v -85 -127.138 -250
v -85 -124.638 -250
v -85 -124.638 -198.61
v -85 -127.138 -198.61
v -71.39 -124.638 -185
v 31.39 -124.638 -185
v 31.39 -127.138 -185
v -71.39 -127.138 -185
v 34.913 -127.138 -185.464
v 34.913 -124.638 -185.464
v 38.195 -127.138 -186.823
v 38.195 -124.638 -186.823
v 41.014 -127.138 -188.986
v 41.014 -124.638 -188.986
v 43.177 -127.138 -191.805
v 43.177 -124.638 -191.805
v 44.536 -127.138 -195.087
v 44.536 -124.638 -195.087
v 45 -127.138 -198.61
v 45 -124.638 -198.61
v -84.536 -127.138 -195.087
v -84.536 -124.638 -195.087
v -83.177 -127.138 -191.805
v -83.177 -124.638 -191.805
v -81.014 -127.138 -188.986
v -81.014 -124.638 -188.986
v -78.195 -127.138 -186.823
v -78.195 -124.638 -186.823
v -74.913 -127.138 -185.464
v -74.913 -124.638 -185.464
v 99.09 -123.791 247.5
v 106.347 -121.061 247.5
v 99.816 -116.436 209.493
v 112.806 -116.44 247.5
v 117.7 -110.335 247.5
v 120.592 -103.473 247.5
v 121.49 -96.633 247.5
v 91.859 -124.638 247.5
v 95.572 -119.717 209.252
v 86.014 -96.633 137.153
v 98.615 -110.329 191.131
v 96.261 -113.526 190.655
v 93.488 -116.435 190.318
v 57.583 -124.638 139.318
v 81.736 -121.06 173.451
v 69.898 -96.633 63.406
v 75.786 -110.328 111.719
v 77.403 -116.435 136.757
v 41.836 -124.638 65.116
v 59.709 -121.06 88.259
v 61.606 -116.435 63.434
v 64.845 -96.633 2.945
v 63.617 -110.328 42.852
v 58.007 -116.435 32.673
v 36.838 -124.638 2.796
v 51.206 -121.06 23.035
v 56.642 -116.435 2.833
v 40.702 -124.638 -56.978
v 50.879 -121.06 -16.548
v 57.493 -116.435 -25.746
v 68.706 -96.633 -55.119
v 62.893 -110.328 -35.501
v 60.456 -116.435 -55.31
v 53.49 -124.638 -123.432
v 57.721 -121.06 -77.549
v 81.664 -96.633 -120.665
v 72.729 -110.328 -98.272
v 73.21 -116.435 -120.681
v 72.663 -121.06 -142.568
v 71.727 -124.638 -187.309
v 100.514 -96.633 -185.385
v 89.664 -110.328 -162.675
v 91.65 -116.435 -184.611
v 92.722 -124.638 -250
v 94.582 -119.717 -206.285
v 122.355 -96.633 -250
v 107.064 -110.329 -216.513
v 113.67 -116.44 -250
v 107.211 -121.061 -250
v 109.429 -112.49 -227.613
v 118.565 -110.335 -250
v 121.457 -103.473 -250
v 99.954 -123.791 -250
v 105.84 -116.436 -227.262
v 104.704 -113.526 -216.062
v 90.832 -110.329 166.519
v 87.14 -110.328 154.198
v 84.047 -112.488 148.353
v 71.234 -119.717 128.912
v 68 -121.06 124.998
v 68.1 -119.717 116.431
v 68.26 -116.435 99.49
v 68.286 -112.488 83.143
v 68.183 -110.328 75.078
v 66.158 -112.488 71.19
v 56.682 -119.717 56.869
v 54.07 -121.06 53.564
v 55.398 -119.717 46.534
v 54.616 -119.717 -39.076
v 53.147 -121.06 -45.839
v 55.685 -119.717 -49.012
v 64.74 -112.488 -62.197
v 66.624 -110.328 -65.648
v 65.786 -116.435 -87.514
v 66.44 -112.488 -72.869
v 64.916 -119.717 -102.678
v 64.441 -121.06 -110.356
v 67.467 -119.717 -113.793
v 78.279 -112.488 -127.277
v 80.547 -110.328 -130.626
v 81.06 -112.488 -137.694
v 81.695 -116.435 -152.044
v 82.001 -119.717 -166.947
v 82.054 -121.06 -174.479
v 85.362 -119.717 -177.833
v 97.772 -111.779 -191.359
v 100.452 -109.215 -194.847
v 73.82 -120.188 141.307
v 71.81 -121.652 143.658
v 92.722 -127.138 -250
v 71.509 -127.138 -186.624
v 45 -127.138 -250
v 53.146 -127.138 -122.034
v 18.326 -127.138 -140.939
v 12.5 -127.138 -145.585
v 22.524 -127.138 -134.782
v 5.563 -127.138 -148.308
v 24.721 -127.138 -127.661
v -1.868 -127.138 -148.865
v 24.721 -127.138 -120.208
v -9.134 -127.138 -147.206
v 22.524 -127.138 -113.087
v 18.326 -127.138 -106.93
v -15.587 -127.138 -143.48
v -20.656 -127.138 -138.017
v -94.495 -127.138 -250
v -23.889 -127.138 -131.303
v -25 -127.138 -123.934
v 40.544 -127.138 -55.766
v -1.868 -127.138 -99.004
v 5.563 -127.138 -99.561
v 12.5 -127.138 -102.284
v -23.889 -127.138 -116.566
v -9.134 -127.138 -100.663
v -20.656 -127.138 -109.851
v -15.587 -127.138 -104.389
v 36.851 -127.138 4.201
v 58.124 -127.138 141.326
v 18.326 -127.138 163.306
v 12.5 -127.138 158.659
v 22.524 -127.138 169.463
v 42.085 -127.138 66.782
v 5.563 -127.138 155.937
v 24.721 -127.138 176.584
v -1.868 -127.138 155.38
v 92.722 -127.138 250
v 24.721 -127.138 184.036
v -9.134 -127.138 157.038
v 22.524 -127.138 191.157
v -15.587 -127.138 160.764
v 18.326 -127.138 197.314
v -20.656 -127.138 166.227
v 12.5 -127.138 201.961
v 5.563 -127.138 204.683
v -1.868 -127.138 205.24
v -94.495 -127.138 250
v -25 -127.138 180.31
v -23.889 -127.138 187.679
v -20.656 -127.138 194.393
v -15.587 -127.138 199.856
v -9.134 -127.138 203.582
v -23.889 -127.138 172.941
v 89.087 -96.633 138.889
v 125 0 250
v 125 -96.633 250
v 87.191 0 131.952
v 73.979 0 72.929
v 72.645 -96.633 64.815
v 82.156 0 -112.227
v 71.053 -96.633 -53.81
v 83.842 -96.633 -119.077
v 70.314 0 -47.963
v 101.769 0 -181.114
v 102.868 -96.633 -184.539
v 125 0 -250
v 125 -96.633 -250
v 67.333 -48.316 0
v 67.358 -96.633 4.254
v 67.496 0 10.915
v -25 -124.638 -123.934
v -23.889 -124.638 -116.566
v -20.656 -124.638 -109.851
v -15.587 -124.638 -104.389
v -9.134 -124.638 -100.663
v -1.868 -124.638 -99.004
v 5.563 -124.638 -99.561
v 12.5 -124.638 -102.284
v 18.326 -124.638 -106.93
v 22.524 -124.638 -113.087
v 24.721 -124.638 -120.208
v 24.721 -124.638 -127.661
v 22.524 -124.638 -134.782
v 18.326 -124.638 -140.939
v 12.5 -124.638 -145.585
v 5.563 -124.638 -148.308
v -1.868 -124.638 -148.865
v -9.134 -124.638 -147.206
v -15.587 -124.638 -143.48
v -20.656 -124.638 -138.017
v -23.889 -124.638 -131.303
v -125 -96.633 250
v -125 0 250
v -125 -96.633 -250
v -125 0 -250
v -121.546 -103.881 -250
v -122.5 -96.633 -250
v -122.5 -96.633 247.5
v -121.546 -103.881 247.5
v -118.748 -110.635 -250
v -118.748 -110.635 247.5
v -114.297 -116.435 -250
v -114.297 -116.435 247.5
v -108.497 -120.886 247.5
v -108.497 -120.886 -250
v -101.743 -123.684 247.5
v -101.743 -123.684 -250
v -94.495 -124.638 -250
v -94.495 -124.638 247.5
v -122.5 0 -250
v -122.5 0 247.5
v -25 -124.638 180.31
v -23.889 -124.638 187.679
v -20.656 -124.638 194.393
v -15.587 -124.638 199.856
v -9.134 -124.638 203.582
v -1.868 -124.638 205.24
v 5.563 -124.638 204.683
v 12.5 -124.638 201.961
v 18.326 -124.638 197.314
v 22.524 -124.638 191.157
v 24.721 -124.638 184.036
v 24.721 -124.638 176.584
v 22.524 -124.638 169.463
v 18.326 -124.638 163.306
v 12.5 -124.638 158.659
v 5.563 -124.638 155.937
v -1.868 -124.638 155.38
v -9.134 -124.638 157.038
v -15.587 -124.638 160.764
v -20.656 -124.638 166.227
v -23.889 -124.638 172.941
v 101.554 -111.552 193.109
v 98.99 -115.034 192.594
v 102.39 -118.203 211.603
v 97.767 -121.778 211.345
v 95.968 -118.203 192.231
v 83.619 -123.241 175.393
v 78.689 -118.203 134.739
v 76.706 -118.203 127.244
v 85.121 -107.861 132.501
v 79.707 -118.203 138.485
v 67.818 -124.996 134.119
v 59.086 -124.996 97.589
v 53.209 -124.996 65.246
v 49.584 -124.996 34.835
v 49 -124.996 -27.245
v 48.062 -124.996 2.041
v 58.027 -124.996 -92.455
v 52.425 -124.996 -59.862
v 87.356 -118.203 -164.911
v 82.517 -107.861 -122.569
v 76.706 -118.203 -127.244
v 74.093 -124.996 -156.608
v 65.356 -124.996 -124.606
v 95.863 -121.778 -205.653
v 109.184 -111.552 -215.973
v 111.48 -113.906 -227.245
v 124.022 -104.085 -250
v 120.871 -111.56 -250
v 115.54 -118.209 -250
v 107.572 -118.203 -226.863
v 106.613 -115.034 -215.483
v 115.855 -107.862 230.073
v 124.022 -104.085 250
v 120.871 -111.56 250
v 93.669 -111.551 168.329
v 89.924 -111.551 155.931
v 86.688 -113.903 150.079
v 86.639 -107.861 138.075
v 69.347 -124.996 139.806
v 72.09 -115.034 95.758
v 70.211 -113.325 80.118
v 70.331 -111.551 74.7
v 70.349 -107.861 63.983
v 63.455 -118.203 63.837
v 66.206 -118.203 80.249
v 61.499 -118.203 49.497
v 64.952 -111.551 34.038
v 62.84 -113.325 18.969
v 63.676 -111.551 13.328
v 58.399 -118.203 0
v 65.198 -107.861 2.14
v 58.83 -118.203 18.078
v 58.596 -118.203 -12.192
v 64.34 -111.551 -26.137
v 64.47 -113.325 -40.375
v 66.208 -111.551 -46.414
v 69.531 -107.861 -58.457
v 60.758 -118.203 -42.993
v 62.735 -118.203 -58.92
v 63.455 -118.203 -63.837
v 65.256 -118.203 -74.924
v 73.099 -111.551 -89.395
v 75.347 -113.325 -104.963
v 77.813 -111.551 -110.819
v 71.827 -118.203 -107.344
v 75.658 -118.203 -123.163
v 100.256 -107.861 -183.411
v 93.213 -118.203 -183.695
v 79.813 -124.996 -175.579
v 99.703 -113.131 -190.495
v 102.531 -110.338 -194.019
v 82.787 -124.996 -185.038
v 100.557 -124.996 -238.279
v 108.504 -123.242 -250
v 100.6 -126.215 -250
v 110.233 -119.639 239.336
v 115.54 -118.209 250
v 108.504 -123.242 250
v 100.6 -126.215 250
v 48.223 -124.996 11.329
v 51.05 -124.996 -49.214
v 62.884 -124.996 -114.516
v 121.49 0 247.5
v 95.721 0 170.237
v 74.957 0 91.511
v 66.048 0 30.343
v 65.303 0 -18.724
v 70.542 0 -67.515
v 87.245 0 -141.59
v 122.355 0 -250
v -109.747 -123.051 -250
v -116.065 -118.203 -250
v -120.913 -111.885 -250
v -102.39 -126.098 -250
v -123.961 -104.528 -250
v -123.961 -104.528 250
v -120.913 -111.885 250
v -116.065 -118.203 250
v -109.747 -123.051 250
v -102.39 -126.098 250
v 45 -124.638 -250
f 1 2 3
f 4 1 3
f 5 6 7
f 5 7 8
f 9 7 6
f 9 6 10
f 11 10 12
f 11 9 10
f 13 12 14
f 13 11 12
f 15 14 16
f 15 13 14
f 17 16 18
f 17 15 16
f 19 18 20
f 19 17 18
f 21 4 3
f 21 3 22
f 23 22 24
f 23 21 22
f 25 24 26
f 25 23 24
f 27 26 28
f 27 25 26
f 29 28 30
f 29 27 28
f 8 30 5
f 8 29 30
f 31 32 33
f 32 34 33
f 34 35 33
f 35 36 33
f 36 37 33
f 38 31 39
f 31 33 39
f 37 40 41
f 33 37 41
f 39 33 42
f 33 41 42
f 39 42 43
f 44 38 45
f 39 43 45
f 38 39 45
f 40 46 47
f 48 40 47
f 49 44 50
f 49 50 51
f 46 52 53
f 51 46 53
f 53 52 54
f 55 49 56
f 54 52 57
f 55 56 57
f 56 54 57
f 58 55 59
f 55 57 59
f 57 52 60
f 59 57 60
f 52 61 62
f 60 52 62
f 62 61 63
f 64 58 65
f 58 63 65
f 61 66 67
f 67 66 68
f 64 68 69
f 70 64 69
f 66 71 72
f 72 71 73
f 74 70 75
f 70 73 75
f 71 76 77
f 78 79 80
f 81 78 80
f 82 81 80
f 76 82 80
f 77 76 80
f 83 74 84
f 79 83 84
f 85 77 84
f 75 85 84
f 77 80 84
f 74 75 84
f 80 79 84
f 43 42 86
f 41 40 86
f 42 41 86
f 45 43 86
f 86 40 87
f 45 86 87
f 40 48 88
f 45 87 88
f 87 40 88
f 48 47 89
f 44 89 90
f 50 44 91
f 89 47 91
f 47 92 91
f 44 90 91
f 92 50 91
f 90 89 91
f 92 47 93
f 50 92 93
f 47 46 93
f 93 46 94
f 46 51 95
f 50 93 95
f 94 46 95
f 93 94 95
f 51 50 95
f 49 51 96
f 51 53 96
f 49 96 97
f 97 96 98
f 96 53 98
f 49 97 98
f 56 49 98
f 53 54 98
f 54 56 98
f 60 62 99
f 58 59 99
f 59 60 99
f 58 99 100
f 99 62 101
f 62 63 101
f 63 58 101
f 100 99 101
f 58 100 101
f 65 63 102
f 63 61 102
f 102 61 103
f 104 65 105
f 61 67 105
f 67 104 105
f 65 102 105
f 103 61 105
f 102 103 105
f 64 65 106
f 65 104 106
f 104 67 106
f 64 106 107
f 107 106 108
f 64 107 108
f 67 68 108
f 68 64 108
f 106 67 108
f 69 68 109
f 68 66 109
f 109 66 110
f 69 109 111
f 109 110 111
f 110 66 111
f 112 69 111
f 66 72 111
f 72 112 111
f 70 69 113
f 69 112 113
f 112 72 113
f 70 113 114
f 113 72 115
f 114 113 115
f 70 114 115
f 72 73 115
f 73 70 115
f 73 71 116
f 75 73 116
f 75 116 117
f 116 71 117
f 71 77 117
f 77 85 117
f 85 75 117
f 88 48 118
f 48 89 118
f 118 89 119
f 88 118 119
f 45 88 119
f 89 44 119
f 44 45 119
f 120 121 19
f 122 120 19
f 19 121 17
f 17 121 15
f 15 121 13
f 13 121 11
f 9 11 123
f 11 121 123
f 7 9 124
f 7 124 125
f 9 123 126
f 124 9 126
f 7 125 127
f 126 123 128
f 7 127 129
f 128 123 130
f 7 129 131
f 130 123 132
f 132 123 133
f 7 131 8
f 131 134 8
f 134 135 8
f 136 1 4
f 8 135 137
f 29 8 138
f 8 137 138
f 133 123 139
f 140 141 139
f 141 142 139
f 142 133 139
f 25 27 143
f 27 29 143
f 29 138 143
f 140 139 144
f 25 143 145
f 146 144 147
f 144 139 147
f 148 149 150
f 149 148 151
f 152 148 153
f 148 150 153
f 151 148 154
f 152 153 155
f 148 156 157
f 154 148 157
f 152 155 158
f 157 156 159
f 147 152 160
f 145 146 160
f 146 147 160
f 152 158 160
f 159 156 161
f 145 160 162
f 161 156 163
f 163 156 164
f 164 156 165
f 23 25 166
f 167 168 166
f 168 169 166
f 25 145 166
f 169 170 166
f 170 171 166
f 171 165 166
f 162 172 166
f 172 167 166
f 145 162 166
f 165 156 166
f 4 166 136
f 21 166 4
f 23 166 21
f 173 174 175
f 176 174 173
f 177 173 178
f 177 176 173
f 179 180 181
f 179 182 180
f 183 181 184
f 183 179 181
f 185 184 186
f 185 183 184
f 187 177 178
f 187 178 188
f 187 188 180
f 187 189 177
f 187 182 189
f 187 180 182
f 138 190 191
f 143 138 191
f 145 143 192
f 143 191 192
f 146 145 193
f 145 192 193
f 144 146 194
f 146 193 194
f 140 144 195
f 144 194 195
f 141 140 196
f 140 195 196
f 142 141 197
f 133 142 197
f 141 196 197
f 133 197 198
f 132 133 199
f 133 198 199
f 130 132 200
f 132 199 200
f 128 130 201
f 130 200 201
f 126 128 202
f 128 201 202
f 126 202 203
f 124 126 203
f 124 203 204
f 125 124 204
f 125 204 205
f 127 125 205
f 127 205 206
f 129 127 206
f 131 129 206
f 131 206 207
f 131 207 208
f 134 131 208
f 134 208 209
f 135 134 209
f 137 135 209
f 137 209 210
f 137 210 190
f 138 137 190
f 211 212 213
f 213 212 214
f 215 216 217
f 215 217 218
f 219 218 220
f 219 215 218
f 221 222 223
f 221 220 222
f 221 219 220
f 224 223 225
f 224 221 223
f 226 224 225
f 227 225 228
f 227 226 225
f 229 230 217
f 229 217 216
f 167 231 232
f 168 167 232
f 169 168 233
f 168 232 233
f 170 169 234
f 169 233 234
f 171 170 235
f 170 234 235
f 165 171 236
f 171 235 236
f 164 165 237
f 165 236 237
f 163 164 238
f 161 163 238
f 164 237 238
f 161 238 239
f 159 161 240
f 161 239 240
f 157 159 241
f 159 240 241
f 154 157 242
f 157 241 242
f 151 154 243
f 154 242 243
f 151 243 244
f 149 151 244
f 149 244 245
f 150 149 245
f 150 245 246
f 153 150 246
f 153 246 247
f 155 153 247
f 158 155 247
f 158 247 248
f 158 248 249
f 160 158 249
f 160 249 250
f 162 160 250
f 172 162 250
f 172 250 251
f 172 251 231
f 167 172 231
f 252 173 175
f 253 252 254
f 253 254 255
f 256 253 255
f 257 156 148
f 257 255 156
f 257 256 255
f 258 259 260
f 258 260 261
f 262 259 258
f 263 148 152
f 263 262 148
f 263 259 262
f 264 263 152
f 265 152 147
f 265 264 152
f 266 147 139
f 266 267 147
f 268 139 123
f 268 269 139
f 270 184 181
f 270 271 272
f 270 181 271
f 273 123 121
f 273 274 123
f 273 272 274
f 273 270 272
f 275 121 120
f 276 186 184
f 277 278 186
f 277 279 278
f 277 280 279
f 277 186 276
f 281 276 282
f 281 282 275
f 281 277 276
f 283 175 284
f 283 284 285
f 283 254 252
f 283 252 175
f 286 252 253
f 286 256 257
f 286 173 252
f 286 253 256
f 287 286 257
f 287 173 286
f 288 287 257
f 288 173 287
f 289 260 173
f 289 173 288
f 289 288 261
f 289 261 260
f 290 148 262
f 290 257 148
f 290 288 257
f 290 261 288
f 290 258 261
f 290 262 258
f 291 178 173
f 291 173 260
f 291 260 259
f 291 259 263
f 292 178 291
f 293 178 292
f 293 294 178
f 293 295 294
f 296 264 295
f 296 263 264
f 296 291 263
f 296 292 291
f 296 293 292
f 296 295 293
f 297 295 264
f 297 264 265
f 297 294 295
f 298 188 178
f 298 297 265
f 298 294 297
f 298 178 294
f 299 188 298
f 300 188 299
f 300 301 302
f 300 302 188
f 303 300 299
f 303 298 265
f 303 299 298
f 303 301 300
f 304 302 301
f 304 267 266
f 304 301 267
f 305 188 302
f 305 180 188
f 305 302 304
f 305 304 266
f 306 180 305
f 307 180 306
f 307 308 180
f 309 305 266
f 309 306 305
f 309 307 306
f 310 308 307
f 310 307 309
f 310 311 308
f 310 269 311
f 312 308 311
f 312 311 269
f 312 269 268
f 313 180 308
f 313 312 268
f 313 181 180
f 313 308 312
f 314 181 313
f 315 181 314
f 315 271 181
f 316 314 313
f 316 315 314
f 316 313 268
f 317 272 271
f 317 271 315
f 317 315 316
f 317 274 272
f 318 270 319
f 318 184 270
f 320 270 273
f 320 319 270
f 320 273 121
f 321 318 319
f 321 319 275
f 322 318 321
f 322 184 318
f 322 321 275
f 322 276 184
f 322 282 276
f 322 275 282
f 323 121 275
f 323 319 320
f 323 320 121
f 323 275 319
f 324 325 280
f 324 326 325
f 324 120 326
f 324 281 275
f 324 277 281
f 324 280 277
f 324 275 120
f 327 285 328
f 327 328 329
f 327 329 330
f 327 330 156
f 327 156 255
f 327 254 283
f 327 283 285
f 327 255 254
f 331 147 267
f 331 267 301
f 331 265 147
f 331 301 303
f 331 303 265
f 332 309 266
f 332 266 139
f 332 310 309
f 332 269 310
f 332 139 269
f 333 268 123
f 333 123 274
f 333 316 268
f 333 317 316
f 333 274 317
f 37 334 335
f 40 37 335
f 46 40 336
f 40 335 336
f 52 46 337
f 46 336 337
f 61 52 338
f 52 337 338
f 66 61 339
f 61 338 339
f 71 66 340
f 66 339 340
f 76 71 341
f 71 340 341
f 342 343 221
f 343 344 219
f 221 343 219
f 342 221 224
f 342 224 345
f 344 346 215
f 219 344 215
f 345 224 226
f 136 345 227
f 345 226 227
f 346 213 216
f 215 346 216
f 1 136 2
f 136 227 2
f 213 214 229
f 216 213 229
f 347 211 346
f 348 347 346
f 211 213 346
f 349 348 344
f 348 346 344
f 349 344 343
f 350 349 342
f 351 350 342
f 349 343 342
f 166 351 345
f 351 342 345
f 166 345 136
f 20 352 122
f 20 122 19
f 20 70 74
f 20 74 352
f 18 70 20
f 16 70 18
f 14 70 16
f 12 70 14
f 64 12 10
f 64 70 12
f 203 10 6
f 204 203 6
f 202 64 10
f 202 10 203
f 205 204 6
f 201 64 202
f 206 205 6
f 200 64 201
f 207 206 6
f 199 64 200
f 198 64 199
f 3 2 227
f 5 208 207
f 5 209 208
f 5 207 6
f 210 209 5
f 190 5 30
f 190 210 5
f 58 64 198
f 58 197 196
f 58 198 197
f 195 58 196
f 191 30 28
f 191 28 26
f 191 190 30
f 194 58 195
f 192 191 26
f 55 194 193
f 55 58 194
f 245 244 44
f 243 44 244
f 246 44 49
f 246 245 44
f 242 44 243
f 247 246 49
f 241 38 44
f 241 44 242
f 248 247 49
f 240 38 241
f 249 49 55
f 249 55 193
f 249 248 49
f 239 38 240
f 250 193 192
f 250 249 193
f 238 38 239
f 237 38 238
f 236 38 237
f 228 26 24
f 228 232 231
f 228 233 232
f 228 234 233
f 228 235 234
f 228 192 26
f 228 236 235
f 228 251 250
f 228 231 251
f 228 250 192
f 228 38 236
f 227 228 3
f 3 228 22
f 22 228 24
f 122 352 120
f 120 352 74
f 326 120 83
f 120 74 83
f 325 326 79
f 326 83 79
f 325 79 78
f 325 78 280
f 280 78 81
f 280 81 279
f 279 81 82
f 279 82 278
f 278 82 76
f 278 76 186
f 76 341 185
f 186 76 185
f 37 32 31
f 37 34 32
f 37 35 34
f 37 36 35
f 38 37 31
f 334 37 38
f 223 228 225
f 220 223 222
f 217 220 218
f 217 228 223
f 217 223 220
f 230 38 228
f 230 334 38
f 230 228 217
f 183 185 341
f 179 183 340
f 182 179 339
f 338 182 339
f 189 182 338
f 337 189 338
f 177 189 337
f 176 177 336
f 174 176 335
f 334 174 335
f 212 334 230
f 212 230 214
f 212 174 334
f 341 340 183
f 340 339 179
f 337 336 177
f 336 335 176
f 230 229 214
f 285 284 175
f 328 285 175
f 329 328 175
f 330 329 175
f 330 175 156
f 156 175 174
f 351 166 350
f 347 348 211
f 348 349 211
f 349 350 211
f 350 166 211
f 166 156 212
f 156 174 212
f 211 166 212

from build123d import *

# Parameters (mm, degrees)
F0_DEPTH = 127.137767151
F8_R     = 30.5052612997
F9_W     = 130
F9_H     = 65
F1_DEPTH = 404.413504526
F2_R     = 13.6095495466
F3_T     = -2.5
F5_D     = 50


with BuildPart() as f0:
    # F7 (on Front) → F0 (new body)
    with BuildSketch(Plane.XZ):
        with BuildLine():
            add(Edge.make_bspline(
                [(125, 250), (96.1666926742, 166.6666666667), (38.5000792642, 0), (96.1666901906, -166.6666666667), (125, -250)],
                knots=[0, 0, 0, 0, 0.5, 1, 1, 1, 1], degree=3))
            Line((125, 250), (-125, 250))
            Line((-125, 250), (-125, -250))
            Line((-125, -250), (125, -250))
        make_face()
    extrude(amount=F0_DEPTH)

    # F8
    f8_edges = [f0.edges().sort_by_distance(p)[0] for p in [
        (67.333385, -127.137767, 0),
        (-125, -127.137767, 0),
    ]]
    fillet(f8_edges, radius=F8_R)

    # F9 (on face) → F1 (cut)
    with BuildSketch(Plane(origin=(0, 0, 0), x_dir=(-1, 0, 0), z_dir=(0, 1, 0))):
        with Locations((20, -217.5)):
            Rectangle(F9_W, F9_H)
    extrude(amount=-F1_DEPTH, mode=Mode.SUBTRACT)

    # F2
    f2_edges = [f0.edges().sort_by_distance(p)[0] for p in [
        (45, -63.568884, -185),
        (-85, -63.568884, -185),
    ]]
    fillet(f2_edges, radius=F2_R)

    # F3
    f3_openings = [f0.faces().sort_by_distance(p)[0] for p in [
        (-17.051006, 0, 18.486444),
        (-20, -63.568884, -185),
        (-81.013855, -63.568884, -188.986145),
        (41.013855, -63.568884, -188.986145),
        (84.304295, -62.364714, -250),
        (-104.461032, -61.249084, -250),
        (-85, -63.568884, -224.304775),
        (45, -63.568884, -224.304775),
    ]]
    offset(amount=F3_T, openings=f3_openings, kind=Kind.INTERSECTION)

    # F5 (through all)
    with Locations(Plane.XZ.offset(127.137767151)):
        with Locations((0, 180.3100854158), (0, -123.9344850183)):
            Hole(F5_D / 2)


solid = f0.part
